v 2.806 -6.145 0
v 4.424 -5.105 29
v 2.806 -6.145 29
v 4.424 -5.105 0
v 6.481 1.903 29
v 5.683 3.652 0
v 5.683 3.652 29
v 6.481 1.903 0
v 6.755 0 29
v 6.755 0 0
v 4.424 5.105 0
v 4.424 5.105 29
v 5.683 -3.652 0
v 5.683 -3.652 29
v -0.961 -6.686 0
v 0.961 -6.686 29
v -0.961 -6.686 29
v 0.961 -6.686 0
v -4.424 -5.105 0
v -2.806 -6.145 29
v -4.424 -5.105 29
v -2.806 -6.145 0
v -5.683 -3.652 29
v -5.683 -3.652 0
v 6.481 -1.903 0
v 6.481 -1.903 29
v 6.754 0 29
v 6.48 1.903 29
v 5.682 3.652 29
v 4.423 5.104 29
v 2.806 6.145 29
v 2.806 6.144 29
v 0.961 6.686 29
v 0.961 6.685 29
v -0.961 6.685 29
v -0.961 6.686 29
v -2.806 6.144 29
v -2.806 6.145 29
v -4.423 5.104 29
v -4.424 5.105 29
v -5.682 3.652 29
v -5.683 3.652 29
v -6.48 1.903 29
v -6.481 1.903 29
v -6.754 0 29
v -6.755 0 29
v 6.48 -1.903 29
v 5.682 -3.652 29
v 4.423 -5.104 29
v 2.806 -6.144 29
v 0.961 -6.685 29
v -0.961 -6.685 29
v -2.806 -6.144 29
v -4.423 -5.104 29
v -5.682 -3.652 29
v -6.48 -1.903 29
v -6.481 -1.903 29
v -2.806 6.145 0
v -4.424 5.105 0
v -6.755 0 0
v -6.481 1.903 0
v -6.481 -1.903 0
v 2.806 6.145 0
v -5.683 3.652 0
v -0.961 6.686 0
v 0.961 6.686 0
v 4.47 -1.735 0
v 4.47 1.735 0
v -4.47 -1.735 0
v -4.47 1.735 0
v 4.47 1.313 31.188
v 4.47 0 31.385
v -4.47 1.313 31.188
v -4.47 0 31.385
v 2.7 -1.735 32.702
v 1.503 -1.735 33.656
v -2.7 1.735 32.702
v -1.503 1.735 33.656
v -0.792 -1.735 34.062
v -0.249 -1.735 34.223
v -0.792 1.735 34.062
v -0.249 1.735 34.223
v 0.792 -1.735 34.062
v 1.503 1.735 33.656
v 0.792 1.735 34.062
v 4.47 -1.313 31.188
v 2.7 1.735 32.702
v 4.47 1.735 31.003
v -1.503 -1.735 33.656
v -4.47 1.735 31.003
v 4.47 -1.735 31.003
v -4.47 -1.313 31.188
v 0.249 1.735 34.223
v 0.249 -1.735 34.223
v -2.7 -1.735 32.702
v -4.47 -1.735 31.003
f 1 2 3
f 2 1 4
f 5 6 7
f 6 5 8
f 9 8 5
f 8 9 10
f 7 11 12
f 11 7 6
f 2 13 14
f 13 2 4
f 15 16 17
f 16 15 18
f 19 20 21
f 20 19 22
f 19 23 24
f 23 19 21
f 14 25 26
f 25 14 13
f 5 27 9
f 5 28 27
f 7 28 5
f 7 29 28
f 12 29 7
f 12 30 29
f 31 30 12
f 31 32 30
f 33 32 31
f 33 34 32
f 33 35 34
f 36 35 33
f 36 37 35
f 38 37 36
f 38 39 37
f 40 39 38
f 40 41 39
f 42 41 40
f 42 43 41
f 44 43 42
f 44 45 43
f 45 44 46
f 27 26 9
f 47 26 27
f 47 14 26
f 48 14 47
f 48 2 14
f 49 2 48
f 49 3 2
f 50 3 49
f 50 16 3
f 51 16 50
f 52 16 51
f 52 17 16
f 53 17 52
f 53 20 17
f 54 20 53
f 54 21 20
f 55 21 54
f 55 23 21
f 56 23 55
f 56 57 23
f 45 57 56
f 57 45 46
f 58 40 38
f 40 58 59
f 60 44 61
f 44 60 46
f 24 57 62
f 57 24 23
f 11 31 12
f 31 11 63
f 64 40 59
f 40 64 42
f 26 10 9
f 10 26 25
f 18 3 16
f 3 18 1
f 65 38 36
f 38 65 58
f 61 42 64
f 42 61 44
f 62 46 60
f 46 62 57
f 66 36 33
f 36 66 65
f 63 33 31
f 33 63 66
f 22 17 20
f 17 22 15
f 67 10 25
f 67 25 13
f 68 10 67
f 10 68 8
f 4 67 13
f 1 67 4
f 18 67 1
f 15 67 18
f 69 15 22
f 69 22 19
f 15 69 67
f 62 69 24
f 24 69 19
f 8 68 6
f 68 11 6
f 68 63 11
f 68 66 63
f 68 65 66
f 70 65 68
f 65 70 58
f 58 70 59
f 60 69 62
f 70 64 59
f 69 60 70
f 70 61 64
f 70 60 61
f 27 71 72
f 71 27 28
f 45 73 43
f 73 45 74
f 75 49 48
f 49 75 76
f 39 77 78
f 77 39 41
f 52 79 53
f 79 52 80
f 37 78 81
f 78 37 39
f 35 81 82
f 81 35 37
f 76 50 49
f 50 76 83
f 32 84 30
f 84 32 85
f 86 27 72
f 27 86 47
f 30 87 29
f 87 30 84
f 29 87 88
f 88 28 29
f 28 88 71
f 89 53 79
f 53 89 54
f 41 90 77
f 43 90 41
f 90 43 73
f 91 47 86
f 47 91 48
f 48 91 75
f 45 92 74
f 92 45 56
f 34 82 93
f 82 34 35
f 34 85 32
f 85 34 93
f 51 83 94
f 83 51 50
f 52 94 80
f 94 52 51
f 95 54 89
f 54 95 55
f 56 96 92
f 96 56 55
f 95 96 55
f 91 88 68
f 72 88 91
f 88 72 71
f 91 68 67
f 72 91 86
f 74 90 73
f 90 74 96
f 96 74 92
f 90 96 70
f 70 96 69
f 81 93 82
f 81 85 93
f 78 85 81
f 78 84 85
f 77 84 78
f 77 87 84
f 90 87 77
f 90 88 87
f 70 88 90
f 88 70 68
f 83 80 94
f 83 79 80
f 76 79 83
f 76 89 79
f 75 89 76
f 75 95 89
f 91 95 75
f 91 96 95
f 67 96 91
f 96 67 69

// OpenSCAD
innerWidth=8.34;
innerThickness=2.87;
connectorLength=29;
tolerance=0.3;
outerDiameter=14.11;
nudge = 0.001;

difference() {
    union() {
    cylinder(d=outerDiameter-2*tolerance,h=connectorLength);
        translate([0,0,connectorLength-nudge])
    cylinder(d1=outerDiameter-2*tolerance,d2=0,h=outerDiameter/2);
    }
    translate([0,0,-nudge]) {
        cube([innerWidth+2*tolerance,innerThickness+2*tolerance,3*connectorLength], center=true);
    }
}
